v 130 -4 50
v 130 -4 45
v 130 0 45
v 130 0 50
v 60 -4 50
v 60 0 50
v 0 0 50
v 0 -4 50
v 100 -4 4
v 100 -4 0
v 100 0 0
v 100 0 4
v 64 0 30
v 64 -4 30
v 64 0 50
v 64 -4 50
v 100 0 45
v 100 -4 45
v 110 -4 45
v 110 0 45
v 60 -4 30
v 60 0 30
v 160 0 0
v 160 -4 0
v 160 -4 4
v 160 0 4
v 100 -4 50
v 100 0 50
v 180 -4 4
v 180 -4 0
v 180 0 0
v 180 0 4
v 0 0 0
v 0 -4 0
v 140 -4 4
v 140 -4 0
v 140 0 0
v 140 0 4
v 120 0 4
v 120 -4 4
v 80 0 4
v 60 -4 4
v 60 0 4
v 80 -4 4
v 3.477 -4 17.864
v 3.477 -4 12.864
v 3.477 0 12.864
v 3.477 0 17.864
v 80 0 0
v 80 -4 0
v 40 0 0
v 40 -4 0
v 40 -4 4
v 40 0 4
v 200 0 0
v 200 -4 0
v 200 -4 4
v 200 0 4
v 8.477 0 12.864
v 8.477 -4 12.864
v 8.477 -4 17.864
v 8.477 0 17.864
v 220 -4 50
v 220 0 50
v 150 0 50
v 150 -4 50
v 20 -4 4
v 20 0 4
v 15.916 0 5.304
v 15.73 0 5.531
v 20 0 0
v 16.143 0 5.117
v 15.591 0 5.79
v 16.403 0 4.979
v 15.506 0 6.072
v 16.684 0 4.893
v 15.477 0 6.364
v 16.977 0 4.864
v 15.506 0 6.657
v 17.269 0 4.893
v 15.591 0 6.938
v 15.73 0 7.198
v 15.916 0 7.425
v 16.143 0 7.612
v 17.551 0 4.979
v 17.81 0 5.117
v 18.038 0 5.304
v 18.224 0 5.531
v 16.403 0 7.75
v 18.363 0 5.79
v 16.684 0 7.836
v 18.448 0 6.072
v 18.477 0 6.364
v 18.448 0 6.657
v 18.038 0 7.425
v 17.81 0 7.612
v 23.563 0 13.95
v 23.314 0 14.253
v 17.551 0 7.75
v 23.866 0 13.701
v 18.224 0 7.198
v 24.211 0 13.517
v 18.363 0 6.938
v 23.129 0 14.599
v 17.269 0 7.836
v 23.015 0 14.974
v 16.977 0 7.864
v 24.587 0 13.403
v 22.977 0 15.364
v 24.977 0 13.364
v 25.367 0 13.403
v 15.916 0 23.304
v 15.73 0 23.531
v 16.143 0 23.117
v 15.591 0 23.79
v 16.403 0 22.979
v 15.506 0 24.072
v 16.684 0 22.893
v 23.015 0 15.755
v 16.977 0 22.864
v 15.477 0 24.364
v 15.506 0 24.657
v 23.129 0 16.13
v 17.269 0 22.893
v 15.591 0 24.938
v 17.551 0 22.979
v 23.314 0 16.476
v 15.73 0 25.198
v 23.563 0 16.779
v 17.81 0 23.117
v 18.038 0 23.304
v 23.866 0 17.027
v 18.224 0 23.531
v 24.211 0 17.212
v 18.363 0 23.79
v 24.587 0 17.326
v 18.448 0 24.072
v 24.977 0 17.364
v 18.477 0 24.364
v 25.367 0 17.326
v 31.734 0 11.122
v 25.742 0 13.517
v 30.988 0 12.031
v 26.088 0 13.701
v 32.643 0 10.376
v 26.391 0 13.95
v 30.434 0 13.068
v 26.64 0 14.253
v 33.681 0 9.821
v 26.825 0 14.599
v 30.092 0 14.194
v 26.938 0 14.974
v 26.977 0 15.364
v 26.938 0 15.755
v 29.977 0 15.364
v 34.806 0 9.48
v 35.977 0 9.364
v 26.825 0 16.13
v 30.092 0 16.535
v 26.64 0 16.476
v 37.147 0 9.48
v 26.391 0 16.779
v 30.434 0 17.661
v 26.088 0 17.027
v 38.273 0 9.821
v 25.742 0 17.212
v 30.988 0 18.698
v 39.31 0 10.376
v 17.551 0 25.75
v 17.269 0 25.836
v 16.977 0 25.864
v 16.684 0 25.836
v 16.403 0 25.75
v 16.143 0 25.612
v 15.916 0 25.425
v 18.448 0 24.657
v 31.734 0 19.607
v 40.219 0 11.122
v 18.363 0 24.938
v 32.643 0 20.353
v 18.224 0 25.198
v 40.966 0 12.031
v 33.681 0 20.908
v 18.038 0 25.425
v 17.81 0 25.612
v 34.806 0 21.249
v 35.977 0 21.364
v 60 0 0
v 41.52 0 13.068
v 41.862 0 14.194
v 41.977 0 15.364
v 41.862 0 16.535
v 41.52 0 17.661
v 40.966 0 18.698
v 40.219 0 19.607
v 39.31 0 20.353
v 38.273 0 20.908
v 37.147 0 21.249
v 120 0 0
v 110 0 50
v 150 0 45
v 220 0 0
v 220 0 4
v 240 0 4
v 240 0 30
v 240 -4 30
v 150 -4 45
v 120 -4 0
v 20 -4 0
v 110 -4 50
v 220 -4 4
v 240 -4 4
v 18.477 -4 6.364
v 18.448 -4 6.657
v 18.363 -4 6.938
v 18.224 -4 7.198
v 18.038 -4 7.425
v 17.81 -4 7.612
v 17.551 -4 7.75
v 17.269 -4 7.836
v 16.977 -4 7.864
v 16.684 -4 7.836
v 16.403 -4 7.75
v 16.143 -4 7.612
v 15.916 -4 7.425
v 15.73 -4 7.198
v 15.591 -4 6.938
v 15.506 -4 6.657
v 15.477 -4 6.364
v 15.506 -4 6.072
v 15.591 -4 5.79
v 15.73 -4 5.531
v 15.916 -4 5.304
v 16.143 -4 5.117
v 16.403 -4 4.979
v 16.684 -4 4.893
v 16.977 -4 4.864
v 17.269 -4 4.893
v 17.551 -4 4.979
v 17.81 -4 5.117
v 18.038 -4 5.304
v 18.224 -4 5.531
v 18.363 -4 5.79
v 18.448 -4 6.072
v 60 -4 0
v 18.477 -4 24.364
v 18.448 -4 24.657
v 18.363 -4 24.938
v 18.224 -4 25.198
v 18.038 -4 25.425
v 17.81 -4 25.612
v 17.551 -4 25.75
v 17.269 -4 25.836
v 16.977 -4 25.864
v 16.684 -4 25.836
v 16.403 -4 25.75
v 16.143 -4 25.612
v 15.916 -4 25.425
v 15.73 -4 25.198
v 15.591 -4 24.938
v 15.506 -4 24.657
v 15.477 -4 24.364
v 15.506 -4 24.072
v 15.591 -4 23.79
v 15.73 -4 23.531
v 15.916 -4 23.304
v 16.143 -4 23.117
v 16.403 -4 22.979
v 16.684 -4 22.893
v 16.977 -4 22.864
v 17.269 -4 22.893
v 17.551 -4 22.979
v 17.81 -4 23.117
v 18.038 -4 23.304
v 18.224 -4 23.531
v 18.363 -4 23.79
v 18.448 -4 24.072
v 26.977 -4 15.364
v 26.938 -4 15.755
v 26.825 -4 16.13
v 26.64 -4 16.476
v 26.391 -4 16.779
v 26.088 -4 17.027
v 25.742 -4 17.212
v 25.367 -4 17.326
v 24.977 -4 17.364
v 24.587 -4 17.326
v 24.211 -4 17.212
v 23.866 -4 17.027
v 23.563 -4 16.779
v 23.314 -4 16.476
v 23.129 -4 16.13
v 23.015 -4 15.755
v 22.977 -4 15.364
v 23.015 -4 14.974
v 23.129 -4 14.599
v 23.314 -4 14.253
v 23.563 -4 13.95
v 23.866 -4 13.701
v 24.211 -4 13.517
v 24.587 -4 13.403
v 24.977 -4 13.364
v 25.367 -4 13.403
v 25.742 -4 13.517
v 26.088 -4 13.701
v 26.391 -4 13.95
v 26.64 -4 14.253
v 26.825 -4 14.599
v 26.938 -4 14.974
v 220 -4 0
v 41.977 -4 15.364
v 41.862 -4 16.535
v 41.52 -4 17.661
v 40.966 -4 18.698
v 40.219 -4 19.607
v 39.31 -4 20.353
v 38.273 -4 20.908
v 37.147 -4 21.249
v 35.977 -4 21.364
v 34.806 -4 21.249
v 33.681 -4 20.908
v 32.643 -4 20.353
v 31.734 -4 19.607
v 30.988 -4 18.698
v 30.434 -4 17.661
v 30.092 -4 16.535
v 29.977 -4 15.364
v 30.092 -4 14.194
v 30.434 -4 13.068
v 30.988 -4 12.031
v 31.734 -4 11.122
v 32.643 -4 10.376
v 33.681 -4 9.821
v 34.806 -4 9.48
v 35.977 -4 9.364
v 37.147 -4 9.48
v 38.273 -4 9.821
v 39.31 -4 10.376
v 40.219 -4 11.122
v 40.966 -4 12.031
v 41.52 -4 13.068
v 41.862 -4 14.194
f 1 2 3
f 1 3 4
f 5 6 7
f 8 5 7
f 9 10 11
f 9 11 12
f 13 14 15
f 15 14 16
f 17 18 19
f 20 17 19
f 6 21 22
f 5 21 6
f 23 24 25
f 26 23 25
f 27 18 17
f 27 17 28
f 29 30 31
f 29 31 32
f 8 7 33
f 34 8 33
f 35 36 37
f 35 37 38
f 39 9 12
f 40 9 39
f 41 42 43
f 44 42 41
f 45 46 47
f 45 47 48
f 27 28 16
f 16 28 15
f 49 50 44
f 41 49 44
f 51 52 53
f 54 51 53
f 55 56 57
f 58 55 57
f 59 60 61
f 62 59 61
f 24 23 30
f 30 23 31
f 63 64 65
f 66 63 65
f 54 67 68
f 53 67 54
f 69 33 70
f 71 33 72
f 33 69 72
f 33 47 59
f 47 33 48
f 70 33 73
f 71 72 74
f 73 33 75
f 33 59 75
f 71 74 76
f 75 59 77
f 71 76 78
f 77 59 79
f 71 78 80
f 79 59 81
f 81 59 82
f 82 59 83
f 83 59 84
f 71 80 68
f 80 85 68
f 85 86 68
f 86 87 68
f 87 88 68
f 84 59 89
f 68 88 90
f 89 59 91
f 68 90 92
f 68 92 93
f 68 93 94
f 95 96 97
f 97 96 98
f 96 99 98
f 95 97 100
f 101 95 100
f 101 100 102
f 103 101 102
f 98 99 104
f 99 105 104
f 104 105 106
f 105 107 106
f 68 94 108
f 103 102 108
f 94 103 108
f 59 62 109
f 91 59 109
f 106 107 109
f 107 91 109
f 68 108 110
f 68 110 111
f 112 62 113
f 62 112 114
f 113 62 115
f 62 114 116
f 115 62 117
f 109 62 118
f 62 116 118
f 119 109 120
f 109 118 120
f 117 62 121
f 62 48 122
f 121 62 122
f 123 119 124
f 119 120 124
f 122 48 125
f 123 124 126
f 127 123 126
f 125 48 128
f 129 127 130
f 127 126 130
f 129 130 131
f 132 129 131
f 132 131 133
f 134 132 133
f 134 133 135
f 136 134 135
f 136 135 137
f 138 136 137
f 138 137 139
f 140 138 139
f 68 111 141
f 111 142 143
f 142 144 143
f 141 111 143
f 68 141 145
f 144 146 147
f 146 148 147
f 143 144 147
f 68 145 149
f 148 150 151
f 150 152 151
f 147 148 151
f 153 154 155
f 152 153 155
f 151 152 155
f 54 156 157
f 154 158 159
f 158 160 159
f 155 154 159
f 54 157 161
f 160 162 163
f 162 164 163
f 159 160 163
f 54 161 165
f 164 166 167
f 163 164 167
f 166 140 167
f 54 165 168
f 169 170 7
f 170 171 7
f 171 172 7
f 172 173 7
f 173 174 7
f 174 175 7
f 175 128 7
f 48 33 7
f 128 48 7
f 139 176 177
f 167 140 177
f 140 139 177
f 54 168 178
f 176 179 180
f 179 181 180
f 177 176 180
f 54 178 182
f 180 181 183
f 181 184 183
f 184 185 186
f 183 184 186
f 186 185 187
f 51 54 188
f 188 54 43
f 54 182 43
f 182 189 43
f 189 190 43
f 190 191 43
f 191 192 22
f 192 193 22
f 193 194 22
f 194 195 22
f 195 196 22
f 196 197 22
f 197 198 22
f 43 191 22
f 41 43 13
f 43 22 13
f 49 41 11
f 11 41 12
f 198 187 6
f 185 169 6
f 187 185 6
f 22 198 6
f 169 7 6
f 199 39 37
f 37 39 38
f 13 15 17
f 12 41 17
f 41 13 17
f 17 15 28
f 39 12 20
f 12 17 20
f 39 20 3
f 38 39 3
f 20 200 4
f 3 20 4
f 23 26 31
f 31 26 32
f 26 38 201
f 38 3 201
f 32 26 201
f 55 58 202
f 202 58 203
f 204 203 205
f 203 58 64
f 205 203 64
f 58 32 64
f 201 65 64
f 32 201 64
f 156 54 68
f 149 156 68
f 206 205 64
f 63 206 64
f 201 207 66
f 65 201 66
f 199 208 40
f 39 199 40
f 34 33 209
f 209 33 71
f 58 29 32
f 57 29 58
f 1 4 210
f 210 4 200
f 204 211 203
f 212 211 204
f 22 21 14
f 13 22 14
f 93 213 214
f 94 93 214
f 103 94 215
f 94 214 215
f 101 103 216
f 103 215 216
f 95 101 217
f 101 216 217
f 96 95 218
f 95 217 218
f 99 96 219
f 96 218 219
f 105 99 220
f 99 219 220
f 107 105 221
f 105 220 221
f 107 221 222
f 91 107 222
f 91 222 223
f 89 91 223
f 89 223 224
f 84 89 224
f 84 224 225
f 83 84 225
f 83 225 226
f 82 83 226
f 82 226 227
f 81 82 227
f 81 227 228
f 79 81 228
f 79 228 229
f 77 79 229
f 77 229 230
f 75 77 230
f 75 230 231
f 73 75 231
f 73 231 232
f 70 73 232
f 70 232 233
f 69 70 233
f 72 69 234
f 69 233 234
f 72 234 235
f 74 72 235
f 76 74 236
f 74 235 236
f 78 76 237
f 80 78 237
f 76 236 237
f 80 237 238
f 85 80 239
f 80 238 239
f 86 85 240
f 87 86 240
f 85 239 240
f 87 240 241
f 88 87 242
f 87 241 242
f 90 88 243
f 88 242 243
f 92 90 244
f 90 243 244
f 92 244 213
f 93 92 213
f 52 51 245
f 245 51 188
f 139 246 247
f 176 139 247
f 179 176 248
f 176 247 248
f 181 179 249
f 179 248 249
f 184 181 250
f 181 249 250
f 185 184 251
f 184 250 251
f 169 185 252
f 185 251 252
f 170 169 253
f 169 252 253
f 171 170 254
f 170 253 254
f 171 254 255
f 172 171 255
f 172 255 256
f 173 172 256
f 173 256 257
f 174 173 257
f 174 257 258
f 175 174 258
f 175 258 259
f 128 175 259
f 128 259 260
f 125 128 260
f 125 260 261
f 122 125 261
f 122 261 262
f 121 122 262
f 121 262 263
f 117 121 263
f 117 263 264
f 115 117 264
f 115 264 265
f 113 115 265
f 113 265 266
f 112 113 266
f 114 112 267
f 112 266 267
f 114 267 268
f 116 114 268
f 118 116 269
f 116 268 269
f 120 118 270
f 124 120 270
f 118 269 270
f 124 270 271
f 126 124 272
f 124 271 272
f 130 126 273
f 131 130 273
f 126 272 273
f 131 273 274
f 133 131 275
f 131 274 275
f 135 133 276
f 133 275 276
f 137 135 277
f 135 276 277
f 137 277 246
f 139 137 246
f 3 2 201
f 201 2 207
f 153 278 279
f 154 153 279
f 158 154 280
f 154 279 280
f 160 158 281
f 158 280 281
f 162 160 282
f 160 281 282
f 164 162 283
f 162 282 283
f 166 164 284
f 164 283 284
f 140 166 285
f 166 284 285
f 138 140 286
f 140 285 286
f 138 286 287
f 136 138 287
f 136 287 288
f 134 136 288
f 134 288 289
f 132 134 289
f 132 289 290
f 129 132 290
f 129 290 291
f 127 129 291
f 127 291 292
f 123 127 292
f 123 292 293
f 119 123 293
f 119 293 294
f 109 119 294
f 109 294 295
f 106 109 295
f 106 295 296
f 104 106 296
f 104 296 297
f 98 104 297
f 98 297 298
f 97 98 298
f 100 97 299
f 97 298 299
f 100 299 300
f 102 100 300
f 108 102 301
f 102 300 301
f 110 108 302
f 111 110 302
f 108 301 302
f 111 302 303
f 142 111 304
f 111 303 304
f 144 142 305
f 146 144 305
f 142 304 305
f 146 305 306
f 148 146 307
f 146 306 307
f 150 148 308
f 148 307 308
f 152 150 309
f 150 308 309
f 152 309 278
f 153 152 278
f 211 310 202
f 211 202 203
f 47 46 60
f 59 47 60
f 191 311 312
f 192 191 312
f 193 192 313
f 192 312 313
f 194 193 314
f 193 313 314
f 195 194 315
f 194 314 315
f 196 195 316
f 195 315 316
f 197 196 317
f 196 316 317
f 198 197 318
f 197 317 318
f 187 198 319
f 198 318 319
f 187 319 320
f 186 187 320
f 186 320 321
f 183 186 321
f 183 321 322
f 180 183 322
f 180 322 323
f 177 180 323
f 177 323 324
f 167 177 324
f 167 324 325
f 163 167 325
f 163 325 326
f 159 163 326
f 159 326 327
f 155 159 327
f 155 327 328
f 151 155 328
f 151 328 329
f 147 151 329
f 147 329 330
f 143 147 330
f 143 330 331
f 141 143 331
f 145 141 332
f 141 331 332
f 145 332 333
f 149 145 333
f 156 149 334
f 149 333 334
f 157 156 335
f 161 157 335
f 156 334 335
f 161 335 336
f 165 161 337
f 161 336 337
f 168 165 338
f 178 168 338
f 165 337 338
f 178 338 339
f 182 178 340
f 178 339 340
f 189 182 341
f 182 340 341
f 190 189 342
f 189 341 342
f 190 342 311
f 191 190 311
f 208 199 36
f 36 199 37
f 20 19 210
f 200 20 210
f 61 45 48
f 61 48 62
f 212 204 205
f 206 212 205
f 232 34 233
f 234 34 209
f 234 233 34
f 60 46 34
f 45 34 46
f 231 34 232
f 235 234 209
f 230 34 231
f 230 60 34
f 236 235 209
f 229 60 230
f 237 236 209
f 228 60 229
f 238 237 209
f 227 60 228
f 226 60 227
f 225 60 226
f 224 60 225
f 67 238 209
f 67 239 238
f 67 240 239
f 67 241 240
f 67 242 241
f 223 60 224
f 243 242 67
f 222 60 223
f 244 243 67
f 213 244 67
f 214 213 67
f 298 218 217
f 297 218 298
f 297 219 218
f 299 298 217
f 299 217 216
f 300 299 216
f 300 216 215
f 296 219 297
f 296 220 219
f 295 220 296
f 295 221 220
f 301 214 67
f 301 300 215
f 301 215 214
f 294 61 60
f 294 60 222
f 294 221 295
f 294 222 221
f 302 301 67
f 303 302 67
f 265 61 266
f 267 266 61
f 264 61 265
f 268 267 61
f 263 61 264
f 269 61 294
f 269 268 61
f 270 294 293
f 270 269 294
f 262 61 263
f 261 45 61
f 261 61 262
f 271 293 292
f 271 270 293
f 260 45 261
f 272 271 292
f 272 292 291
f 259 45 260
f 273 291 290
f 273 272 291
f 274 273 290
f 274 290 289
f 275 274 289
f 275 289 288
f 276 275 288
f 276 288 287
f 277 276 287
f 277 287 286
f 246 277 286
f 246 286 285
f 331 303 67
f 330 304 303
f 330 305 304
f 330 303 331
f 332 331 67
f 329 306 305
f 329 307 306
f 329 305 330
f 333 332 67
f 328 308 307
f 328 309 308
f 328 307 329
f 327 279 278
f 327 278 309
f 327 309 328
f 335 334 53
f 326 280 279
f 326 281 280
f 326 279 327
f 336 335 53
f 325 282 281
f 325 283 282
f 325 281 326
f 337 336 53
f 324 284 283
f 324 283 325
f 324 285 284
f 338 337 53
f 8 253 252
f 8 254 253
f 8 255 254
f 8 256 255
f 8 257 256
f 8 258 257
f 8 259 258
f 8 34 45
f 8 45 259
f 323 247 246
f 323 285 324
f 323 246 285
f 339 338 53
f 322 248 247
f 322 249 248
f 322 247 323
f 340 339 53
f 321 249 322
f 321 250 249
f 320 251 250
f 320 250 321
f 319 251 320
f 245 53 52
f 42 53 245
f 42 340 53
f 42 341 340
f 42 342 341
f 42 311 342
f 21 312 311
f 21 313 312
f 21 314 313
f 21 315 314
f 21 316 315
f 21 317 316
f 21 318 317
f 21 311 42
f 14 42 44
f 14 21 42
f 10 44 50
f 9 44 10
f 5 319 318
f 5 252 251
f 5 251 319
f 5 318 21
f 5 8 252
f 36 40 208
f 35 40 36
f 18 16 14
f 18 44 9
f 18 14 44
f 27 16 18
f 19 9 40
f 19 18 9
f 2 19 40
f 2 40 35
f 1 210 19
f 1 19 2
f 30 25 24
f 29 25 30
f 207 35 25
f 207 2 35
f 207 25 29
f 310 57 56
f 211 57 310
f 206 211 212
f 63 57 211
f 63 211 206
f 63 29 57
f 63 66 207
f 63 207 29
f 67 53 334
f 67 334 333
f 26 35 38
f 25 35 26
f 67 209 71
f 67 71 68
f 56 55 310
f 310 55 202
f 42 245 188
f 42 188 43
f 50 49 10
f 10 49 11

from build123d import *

# Parameters (mm, degrees)
PAD_DEPTH       = 4
SKETCH001_R     = 1.5
SKETCH001_R_2   = 2
SKETCH001_R_3   = 6
SKETCH001_W     = 5
SKETCH001_H     = 5
SKETCH001_W_2   = 10
SKETCH001_W_3   = 20
POCKET_DEPTH    = 5
SKETCH002_W     = 20
SKETCH002_H     = 4
POCKET001_DEPTH = 5
SKETCH003_W     = 4
SKETCH003_H     = 20
POCKET002_DEPTH = 5


with BuildPart() as part:
    # Sketch → Pad (new body)
    with BuildSketch(Plane.XZ):
        Polygon((0, 0), (240, 0), (240, 30), (220, 50), (0, 50), align=None)
    extrude(amount=PAD_DEPTH)

    # Sketch001 (on Face7 of Pad) → Pocket (cut)
    with BuildSketch(Plane.XZ.offset(4)):
        with Locations((16.976847, 24.364438)):
            Circle(SKETCH001_R)
        with Locations((24.976847, 15.364438)):
            Circle(SKETCH001_R_2)
        with Locations((35.976847, 15.364438)):
            Circle(SKETCH001_R_3)
        with Locations((16.976847, 6.364438)):
            Circle(SKETCH001_R)
        with Locations((5.976847, 15.364438)):
            Rectangle(SKETCH001_W, SKETCH001_H)
        with Locations((105, 47.5)):
            Rectangle(SKETCH001_W_2, SKETCH001_H)
        with Locations((140, 47.5)):
            Rectangle(SKETCH001_W_3, SKETCH001_H)
    extrude(amount=-POCKET_DEPTH, mode=Mode.SUBTRACT)

    # Sketch002 (on Face5 of Pocket) → Pocket001 (cut)
    with BuildSketch(Plane.XZ.offset(4)):
        with Locations((30, 2)):
            Rectangle(SKETCH002_W, SKETCH002_H)
        with Locations((70, 2)):
            Rectangle(SKETCH002_W, SKETCH002_H)
        with Locations((110, 2)):
            Rectangle(SKETCH002_W, SKETCH002_H)
        with Locations((150, 2)):
            Rectangle(SKETCH002_W, SKETCH002_H)
        with Locations((190, 2)):
            Rectangle(SKETCH002_W, SKETCH002_H)
        with Locations((230, 2)):
            Rectangle(SKETCH002_W, SKETCH002_H)
    extrude(amount=-POCKET001_DEPTH, mode=Mode.SUBTRACT)

    # Sketch003 (on Face4 of Pocket001) → Pocket002 (cut)
    with BuildSketch(Plane.XZ.offset(4)):
        with Locations((62, 40)):
            Rectangle(SKETCH003_W, SKETCH003_H)
    extrude(amount=-POCKET002_DEPTH, mode=Mode.SUBTRACT)


solid = part.part
